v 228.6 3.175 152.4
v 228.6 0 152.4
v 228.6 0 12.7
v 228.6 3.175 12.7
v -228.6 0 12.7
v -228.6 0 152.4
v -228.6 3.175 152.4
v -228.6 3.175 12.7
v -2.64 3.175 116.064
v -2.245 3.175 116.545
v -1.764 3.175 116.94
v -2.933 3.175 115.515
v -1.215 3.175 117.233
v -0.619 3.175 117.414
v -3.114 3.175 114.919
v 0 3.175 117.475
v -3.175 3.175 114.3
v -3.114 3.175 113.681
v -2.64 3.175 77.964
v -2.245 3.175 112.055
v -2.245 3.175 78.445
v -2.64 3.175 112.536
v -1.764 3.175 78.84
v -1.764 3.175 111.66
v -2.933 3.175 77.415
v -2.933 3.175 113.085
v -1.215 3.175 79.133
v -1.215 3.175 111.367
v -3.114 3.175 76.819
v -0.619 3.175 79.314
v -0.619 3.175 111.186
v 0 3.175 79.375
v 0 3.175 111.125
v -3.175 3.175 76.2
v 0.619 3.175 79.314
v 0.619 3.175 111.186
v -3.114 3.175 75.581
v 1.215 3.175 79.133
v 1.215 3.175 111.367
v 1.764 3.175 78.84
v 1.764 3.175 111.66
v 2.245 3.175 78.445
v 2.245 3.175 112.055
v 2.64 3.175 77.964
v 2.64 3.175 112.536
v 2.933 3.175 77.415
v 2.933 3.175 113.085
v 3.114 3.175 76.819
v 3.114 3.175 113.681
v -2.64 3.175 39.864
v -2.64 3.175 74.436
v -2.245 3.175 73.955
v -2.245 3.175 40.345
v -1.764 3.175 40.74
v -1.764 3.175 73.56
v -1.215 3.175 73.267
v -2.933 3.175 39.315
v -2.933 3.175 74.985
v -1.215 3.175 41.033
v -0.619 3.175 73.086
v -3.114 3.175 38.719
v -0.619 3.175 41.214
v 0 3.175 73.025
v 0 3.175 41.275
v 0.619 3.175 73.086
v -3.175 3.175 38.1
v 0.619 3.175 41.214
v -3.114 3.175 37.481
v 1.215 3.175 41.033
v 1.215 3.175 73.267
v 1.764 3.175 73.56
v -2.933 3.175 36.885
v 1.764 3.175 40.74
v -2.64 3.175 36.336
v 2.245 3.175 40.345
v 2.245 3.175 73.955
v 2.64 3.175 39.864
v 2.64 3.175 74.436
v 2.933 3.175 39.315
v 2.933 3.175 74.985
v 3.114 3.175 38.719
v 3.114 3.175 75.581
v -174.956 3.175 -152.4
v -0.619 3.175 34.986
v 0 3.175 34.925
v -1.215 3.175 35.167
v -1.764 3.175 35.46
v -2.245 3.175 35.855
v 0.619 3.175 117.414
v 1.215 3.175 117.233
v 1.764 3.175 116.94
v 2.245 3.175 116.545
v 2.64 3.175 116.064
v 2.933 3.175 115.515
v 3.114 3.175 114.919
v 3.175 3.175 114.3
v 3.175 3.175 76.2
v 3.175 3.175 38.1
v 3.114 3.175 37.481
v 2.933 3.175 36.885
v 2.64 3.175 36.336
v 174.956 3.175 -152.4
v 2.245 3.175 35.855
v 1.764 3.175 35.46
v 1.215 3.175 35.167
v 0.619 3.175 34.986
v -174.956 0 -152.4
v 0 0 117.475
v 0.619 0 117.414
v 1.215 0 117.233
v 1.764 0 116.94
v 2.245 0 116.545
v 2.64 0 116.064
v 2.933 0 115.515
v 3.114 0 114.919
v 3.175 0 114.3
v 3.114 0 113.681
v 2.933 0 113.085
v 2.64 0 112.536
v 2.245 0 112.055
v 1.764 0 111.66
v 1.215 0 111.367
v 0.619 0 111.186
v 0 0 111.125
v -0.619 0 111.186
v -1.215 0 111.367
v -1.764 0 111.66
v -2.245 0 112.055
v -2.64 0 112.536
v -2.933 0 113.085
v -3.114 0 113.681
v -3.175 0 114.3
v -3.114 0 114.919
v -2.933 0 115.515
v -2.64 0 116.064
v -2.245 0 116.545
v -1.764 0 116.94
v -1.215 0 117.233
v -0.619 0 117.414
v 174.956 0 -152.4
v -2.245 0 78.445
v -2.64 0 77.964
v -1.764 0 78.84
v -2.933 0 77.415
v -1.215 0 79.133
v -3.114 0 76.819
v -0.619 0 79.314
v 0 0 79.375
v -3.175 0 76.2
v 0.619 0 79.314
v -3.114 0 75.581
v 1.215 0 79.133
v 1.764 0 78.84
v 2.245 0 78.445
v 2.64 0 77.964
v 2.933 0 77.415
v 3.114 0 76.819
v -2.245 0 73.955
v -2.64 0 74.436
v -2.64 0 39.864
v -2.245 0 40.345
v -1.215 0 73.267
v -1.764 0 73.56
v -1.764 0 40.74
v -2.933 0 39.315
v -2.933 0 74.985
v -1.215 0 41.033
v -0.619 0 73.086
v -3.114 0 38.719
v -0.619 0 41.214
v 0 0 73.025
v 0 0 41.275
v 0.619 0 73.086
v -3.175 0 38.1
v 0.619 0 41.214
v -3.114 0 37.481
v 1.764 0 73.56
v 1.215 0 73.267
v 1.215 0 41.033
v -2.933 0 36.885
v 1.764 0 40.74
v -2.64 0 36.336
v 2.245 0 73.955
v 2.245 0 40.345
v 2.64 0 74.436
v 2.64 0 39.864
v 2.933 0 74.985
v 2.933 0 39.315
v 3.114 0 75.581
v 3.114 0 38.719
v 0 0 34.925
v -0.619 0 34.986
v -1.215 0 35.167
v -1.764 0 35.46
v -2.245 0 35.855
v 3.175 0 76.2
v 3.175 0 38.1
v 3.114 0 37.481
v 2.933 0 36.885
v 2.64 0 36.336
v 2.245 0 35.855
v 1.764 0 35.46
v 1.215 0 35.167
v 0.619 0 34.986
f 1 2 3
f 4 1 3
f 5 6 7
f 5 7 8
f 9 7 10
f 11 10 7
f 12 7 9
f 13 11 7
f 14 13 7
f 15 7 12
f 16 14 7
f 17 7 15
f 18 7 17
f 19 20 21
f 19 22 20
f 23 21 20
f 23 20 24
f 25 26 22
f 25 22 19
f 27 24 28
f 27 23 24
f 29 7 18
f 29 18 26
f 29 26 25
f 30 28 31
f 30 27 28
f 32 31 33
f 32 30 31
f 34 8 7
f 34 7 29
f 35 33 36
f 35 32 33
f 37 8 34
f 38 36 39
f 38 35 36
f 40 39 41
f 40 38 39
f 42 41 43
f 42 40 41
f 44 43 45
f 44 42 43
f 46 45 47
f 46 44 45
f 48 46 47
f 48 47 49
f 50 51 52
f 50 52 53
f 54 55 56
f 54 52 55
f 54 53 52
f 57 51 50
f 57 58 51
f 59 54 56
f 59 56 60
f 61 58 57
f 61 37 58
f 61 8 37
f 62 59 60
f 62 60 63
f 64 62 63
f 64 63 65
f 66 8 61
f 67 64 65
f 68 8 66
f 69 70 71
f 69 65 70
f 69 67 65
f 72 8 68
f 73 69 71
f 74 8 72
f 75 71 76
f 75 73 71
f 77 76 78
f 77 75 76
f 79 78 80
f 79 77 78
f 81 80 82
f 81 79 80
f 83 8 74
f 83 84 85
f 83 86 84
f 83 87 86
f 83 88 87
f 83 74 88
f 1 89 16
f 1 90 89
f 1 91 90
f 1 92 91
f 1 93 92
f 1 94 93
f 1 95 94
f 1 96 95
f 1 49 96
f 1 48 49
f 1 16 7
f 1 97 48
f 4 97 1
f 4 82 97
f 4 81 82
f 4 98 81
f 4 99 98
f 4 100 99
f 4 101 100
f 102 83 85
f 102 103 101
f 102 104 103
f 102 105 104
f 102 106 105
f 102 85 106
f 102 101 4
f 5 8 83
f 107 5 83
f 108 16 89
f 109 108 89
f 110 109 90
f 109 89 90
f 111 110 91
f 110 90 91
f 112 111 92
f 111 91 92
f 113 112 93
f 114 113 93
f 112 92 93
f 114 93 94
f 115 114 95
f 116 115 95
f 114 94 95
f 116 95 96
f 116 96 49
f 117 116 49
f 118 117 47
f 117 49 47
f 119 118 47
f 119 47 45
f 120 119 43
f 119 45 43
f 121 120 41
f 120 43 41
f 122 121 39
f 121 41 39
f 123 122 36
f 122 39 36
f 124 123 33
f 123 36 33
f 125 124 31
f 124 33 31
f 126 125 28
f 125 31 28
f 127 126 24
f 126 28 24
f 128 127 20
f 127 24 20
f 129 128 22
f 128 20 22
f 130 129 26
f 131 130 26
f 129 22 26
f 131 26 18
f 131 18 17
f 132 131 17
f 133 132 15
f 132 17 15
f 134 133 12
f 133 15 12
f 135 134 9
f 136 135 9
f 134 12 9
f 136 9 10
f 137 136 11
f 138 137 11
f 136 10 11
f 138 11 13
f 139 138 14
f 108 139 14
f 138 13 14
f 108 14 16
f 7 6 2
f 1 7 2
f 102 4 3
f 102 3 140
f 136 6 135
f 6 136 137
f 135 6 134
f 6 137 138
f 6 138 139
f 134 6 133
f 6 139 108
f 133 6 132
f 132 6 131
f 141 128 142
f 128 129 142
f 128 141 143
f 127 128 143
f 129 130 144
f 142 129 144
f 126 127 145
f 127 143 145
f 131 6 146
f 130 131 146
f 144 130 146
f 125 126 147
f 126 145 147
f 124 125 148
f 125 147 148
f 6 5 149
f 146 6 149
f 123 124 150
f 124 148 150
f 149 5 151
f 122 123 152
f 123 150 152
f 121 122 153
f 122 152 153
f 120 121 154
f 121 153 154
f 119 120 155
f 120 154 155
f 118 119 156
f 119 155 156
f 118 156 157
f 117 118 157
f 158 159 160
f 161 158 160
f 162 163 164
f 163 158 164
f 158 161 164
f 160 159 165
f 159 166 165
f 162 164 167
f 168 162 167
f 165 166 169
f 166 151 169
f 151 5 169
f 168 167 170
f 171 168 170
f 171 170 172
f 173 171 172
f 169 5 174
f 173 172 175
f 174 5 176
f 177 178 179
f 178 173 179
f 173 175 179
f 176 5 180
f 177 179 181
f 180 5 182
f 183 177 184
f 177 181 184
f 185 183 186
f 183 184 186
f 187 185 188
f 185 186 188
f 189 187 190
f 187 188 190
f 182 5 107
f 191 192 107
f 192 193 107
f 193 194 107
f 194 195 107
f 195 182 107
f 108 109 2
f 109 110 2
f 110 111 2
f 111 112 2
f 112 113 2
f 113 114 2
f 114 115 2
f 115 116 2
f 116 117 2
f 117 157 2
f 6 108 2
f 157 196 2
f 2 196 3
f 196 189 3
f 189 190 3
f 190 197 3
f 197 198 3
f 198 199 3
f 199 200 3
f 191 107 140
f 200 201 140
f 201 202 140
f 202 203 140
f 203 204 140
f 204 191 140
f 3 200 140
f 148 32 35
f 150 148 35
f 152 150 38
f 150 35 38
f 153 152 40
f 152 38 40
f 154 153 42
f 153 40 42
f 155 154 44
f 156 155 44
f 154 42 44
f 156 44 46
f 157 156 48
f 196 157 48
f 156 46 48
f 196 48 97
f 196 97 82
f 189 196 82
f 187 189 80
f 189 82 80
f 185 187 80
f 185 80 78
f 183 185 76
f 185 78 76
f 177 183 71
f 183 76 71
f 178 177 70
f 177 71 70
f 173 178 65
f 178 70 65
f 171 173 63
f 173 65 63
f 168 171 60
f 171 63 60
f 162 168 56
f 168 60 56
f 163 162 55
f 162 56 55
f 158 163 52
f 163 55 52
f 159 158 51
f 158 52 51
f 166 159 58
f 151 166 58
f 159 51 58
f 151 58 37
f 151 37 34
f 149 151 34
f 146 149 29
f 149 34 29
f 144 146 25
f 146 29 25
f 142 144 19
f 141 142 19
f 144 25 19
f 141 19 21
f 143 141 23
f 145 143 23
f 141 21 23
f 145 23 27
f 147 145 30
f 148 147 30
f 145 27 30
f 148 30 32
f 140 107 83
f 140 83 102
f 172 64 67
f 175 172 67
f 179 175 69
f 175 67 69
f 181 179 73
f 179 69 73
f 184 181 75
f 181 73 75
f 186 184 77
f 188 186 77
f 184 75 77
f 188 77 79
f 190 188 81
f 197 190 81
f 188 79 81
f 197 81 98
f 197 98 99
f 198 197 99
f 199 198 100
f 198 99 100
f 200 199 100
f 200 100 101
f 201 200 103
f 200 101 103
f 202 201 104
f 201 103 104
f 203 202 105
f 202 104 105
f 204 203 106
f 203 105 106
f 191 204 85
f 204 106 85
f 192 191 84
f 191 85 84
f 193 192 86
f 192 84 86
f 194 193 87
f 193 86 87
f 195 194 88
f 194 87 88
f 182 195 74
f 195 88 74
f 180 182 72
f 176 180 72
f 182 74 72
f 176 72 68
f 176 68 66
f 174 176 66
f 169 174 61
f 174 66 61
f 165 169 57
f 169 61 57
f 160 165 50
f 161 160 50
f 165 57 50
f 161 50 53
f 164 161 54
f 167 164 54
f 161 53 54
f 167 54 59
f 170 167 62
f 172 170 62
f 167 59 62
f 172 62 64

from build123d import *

# Parameters (mm, degrees)
SKETCH2_W           = 457.2
SKETCH2_H           = 304.8
BOSS_EXTRUDE1_DEPTH = 3.175
CUT_EXTRUDE1_DEPTH  = 3.175
SKETCH5_R           = 3.175
CUT_EXTRUDE3_DEPTH  = 3.175


with BuildPart() as part:
    # Sketch2 → Boss-Extrude1 (new body)
    with BuildSketch(Plane(origin=(0, 0, 0), x_dir=(1, 0, 0), z_dir=(0, 1, 0))):
        Rectangle(SKETCH2_W, SKETCH2_H)
    extrude(amount=BOSS_EXTRUDE1_DEPTH)

    # Sketch3 → Cut-Extrude1 (cut)
    with BuildSketch(Plane(origin=(0, 3.175, 0), x_dir=(1, 0, 0), z_dir=(0, 1, 0))):
        Polygon((-228.6, -12.7), (-174.955758152, 152.4), (-228.6, 152.4), align=None)
        Polygon((174.955758152, 152.4), (228.6, 152.4), (228.6, -12.7), align=None)
    extrude(amount=-CUT_EXTRUDE1_DEPTH, mode=Mode.SUBTRACT)

    # Sketch5 → Cut-Extrude3 (cut)
    with BuildSketch(Plane(origin=(0, 3.175, 0), x_dir=(1, 0, 0), z_dir=(0, 1, 0))):
        with Locations(Location((0, -114.3, 0), (0, 0, 270))):
            Circle(SKETCH5_R)
        with Locations(Location((0, -76.2, 0), (0, 0, 270))):
            Circle(SKETCH5_R)
        with Locations(Location((0, -38.1, 0), (0, 0, 270))):
            Circle(SKETCH5_R)
    extrude(amount=-CUT_EXTRUDE3_DEPTH, mode=Mode.SUBTRACT)


solid = part.part
